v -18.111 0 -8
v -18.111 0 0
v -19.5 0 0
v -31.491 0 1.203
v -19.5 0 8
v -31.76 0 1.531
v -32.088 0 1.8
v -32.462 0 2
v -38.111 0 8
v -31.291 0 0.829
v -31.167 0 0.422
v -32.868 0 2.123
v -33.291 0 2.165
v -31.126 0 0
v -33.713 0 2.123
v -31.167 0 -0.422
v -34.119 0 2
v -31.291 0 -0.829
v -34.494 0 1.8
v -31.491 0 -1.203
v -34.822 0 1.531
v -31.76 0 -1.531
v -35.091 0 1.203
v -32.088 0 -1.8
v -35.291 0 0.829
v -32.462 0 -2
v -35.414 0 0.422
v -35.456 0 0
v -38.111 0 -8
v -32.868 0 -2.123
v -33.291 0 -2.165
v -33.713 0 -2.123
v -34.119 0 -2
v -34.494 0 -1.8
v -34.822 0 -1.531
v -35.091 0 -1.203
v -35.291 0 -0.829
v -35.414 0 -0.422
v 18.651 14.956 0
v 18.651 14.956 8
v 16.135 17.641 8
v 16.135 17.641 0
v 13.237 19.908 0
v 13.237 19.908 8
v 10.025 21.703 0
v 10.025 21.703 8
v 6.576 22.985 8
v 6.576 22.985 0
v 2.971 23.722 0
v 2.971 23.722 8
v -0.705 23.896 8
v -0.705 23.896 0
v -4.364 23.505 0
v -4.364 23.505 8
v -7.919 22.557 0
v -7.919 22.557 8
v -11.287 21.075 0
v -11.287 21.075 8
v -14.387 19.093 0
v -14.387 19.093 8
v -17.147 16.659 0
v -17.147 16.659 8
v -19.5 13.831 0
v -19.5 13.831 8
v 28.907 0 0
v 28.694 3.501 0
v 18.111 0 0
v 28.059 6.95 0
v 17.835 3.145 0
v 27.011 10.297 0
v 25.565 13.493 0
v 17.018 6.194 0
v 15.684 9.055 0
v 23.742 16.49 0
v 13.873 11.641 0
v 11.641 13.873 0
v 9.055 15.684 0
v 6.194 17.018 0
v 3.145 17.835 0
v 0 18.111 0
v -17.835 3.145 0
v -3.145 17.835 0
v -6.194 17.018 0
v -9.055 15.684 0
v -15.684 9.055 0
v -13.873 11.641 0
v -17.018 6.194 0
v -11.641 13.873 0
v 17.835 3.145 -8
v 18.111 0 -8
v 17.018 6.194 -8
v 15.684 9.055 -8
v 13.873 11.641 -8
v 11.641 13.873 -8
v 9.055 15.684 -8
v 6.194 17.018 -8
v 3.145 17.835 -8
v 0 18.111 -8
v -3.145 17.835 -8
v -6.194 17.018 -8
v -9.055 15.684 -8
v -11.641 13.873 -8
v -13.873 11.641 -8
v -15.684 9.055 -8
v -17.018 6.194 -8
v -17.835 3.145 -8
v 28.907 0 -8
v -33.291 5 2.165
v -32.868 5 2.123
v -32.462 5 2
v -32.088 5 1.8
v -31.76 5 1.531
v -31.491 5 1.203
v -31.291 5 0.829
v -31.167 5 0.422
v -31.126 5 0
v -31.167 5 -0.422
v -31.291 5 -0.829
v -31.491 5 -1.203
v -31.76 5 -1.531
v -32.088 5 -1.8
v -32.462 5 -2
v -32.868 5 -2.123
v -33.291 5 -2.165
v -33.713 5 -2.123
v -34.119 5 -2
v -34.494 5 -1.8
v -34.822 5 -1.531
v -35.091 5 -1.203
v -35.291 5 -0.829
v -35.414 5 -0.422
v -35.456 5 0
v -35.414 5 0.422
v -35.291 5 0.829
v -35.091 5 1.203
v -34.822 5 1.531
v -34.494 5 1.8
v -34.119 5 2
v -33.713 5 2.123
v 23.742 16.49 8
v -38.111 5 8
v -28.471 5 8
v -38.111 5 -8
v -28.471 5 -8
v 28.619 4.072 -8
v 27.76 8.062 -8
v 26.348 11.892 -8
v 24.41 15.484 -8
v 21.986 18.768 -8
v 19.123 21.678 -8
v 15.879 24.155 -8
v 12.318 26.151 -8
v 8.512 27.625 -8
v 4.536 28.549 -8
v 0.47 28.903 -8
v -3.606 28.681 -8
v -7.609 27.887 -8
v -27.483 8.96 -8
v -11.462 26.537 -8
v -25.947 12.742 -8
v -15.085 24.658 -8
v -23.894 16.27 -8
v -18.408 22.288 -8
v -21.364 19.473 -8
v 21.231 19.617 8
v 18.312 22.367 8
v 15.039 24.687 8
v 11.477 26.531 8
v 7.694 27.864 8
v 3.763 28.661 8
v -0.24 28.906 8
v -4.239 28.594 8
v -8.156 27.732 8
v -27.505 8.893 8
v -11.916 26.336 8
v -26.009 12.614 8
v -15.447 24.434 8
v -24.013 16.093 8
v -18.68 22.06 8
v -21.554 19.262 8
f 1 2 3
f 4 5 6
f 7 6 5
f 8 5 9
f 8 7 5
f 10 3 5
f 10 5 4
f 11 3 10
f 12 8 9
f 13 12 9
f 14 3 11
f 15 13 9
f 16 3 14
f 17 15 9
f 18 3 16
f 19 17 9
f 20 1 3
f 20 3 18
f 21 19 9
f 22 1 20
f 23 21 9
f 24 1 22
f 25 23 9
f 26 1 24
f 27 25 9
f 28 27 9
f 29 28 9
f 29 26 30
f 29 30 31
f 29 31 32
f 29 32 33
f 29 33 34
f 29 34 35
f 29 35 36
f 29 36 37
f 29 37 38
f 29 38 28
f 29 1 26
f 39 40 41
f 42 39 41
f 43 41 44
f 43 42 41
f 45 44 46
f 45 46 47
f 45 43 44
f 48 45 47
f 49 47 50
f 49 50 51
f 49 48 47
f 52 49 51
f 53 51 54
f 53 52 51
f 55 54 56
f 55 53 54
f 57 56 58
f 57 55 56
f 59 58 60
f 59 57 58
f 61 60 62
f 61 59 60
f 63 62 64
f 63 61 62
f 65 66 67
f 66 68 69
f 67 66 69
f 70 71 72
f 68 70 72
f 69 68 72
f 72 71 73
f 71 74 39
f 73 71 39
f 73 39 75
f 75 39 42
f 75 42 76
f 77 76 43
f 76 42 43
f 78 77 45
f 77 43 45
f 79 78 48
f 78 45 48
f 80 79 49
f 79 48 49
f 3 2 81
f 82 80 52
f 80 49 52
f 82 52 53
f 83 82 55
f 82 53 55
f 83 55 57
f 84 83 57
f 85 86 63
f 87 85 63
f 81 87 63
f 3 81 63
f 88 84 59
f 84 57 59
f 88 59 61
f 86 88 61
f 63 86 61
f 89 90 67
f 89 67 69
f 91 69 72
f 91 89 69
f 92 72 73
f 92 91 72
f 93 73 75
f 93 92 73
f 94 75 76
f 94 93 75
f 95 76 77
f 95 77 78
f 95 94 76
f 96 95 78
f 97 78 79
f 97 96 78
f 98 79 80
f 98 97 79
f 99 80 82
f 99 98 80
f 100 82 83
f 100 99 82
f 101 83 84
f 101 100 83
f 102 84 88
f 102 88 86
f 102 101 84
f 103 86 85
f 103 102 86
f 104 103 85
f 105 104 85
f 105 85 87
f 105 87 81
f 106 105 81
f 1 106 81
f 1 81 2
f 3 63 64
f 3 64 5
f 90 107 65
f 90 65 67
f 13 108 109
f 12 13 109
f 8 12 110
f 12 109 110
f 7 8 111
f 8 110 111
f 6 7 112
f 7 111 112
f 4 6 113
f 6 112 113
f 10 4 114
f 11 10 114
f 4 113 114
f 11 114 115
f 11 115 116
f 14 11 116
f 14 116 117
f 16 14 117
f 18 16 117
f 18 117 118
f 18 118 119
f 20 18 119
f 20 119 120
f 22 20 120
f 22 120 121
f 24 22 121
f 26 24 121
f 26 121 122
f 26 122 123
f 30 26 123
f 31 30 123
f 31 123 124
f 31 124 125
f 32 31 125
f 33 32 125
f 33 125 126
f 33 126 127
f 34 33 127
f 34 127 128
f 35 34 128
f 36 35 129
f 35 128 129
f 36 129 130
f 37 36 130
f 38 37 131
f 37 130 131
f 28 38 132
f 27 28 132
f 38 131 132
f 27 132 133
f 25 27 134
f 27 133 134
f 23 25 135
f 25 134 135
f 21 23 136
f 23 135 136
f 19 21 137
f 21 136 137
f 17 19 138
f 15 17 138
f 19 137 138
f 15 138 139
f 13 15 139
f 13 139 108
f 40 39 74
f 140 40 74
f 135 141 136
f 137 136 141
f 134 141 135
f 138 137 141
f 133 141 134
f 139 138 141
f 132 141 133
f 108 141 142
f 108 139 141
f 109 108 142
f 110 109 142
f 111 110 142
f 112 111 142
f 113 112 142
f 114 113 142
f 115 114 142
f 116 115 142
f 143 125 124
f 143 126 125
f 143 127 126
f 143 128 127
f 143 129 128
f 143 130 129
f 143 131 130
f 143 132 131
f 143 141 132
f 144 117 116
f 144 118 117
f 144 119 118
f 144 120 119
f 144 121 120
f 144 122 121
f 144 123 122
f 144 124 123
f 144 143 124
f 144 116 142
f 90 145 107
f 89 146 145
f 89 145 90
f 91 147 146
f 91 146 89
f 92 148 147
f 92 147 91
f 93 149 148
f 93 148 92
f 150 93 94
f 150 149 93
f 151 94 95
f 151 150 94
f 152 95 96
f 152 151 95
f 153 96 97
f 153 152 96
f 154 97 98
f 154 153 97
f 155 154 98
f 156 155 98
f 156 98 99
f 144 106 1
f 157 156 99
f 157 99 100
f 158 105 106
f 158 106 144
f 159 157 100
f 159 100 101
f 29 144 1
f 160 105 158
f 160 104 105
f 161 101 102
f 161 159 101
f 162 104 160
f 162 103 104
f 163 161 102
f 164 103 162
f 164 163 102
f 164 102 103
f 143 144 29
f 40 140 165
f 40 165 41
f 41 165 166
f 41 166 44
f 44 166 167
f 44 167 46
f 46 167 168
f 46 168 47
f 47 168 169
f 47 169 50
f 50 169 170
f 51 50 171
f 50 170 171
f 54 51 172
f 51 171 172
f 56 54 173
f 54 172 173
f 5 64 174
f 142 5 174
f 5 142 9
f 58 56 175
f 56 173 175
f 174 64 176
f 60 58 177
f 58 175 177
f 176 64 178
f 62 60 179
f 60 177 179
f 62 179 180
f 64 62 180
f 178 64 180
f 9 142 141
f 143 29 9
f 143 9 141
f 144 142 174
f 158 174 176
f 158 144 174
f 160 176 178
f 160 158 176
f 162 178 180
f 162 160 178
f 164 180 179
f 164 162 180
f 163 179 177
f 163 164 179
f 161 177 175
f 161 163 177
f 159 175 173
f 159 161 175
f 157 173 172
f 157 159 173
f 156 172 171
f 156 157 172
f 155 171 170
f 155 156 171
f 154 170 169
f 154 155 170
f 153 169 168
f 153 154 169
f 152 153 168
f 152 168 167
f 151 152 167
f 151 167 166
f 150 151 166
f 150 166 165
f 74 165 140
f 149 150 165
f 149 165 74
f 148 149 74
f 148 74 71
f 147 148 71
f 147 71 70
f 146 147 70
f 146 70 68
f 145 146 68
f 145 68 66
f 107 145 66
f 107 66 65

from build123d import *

# Parameters (mm, degrees)
BOSS_EXTRUDE1_DEPTH = 8
CUT_EXTRUDE2_DEPTH  = 8
BOSS_EXTRUDE2_START = 8
BOSS_EXTRUDE2_DEPTH = 8
BOSS_EXTRUDE3_DEPTH = 16
SKETCH8_R           = 2.165
CUT_EXTRUDE3_DEPTH  = 46.694096166


with BuildPart() as part:
    # Sketch1 → Boss-Extrude1 (new body)
    with BuildSketch(Plane.XY):
        with BuildLine():
            Line((-19.5, 13.830605225), (-19.5, 0))
            Line((-19.5, 0), (-28.9068116, 0))
            ThreePointArc((-28.9068116, 0), (0, 28.9068116), (28.9068116, 0))
            Line((28.9068116, 0), (23.9068116, 0))
            ThreePointArc((23.9068116, 0), (7.257851427, 22.778481809), (-19.5, 13.830605225))
        make_face()
    extrude(amount=BOSS_EXTRUDE1_DEPTH)

    # Sketch5 → Cut-Extrude2 (cut)
    with BuildSketch(Plane(origin=(0, 0, 0), x_dir=(-1, 0, 0), z_dir=(0, 0, -1))):
        Polygon((0, 0), (-18.650935532, 14.955876592), (-43.503762329, 22.442447281), (-58.13318285, -8.31229871), align=None)
    extrude(amount=-CUT_EXTRUDE2_DEPTH, mode=Mode.SUBTRACT)

    # Sketch6 → Boss-Extrude2 (add)
    with BuildSketch(Plane(origin=(0, 0, 0), x_dir=(-1, 0, 0), z_dir=(0, 0, -1)).offset(BOSS_EXTRUDE2_START)):
        with BuildLine():
            Line((-28.9068116, 0), (-18.11056, 0))
            ThreePointArc((-18.11056, 0), (0, 18.11056), (18.11056, 0))
            Line((18.11056, 0), (28.9068116, 0))
            ThreePointArc((28.9068116, 0), (0, 28.9068116), (-28.9068116, 0))
        make_face()
    extrude(amount=-BOSS_EXTRUDE2_DEPTH)

    # Sketch7 → Boss-Extrude3 (add, through all)
    with BuildSketch(Plane(origin=(0, 0, -8), x_dir=(-1, 0, 0), z_dir=(0, 0, -1))):
        with BuildLine():
            Line((28.9068116, 0), (38.11056, 0))
            Line((38.11056, 0), (38.11056, 5))
            Line((38.11056, 5), (28.471103893, 5))
            ThreePointArc((28.471103893, 5), (28.797678666, 2.509474109), (28.9068116, 0))
        make_face()
    extrude(amount=-BOSS_EXTRUDE3_DEPTH)

    # Sketch8 → Cut-Extrude3 (cut, through all)
    with BuildSketch(Plane(origin=(0, 5, 0), x_dir=(1, 0, 0), z_dir=(0, 1, 0))):
        with Locations(Location((-33.290831946, 0, 0), (0, 0, 270))):
            Circle(SKETCH8_R)
    extrude(amount=-CUT_EXTRUDE3_DEPTH, mode=Mode.SUBTRACT)


solid = part.part
